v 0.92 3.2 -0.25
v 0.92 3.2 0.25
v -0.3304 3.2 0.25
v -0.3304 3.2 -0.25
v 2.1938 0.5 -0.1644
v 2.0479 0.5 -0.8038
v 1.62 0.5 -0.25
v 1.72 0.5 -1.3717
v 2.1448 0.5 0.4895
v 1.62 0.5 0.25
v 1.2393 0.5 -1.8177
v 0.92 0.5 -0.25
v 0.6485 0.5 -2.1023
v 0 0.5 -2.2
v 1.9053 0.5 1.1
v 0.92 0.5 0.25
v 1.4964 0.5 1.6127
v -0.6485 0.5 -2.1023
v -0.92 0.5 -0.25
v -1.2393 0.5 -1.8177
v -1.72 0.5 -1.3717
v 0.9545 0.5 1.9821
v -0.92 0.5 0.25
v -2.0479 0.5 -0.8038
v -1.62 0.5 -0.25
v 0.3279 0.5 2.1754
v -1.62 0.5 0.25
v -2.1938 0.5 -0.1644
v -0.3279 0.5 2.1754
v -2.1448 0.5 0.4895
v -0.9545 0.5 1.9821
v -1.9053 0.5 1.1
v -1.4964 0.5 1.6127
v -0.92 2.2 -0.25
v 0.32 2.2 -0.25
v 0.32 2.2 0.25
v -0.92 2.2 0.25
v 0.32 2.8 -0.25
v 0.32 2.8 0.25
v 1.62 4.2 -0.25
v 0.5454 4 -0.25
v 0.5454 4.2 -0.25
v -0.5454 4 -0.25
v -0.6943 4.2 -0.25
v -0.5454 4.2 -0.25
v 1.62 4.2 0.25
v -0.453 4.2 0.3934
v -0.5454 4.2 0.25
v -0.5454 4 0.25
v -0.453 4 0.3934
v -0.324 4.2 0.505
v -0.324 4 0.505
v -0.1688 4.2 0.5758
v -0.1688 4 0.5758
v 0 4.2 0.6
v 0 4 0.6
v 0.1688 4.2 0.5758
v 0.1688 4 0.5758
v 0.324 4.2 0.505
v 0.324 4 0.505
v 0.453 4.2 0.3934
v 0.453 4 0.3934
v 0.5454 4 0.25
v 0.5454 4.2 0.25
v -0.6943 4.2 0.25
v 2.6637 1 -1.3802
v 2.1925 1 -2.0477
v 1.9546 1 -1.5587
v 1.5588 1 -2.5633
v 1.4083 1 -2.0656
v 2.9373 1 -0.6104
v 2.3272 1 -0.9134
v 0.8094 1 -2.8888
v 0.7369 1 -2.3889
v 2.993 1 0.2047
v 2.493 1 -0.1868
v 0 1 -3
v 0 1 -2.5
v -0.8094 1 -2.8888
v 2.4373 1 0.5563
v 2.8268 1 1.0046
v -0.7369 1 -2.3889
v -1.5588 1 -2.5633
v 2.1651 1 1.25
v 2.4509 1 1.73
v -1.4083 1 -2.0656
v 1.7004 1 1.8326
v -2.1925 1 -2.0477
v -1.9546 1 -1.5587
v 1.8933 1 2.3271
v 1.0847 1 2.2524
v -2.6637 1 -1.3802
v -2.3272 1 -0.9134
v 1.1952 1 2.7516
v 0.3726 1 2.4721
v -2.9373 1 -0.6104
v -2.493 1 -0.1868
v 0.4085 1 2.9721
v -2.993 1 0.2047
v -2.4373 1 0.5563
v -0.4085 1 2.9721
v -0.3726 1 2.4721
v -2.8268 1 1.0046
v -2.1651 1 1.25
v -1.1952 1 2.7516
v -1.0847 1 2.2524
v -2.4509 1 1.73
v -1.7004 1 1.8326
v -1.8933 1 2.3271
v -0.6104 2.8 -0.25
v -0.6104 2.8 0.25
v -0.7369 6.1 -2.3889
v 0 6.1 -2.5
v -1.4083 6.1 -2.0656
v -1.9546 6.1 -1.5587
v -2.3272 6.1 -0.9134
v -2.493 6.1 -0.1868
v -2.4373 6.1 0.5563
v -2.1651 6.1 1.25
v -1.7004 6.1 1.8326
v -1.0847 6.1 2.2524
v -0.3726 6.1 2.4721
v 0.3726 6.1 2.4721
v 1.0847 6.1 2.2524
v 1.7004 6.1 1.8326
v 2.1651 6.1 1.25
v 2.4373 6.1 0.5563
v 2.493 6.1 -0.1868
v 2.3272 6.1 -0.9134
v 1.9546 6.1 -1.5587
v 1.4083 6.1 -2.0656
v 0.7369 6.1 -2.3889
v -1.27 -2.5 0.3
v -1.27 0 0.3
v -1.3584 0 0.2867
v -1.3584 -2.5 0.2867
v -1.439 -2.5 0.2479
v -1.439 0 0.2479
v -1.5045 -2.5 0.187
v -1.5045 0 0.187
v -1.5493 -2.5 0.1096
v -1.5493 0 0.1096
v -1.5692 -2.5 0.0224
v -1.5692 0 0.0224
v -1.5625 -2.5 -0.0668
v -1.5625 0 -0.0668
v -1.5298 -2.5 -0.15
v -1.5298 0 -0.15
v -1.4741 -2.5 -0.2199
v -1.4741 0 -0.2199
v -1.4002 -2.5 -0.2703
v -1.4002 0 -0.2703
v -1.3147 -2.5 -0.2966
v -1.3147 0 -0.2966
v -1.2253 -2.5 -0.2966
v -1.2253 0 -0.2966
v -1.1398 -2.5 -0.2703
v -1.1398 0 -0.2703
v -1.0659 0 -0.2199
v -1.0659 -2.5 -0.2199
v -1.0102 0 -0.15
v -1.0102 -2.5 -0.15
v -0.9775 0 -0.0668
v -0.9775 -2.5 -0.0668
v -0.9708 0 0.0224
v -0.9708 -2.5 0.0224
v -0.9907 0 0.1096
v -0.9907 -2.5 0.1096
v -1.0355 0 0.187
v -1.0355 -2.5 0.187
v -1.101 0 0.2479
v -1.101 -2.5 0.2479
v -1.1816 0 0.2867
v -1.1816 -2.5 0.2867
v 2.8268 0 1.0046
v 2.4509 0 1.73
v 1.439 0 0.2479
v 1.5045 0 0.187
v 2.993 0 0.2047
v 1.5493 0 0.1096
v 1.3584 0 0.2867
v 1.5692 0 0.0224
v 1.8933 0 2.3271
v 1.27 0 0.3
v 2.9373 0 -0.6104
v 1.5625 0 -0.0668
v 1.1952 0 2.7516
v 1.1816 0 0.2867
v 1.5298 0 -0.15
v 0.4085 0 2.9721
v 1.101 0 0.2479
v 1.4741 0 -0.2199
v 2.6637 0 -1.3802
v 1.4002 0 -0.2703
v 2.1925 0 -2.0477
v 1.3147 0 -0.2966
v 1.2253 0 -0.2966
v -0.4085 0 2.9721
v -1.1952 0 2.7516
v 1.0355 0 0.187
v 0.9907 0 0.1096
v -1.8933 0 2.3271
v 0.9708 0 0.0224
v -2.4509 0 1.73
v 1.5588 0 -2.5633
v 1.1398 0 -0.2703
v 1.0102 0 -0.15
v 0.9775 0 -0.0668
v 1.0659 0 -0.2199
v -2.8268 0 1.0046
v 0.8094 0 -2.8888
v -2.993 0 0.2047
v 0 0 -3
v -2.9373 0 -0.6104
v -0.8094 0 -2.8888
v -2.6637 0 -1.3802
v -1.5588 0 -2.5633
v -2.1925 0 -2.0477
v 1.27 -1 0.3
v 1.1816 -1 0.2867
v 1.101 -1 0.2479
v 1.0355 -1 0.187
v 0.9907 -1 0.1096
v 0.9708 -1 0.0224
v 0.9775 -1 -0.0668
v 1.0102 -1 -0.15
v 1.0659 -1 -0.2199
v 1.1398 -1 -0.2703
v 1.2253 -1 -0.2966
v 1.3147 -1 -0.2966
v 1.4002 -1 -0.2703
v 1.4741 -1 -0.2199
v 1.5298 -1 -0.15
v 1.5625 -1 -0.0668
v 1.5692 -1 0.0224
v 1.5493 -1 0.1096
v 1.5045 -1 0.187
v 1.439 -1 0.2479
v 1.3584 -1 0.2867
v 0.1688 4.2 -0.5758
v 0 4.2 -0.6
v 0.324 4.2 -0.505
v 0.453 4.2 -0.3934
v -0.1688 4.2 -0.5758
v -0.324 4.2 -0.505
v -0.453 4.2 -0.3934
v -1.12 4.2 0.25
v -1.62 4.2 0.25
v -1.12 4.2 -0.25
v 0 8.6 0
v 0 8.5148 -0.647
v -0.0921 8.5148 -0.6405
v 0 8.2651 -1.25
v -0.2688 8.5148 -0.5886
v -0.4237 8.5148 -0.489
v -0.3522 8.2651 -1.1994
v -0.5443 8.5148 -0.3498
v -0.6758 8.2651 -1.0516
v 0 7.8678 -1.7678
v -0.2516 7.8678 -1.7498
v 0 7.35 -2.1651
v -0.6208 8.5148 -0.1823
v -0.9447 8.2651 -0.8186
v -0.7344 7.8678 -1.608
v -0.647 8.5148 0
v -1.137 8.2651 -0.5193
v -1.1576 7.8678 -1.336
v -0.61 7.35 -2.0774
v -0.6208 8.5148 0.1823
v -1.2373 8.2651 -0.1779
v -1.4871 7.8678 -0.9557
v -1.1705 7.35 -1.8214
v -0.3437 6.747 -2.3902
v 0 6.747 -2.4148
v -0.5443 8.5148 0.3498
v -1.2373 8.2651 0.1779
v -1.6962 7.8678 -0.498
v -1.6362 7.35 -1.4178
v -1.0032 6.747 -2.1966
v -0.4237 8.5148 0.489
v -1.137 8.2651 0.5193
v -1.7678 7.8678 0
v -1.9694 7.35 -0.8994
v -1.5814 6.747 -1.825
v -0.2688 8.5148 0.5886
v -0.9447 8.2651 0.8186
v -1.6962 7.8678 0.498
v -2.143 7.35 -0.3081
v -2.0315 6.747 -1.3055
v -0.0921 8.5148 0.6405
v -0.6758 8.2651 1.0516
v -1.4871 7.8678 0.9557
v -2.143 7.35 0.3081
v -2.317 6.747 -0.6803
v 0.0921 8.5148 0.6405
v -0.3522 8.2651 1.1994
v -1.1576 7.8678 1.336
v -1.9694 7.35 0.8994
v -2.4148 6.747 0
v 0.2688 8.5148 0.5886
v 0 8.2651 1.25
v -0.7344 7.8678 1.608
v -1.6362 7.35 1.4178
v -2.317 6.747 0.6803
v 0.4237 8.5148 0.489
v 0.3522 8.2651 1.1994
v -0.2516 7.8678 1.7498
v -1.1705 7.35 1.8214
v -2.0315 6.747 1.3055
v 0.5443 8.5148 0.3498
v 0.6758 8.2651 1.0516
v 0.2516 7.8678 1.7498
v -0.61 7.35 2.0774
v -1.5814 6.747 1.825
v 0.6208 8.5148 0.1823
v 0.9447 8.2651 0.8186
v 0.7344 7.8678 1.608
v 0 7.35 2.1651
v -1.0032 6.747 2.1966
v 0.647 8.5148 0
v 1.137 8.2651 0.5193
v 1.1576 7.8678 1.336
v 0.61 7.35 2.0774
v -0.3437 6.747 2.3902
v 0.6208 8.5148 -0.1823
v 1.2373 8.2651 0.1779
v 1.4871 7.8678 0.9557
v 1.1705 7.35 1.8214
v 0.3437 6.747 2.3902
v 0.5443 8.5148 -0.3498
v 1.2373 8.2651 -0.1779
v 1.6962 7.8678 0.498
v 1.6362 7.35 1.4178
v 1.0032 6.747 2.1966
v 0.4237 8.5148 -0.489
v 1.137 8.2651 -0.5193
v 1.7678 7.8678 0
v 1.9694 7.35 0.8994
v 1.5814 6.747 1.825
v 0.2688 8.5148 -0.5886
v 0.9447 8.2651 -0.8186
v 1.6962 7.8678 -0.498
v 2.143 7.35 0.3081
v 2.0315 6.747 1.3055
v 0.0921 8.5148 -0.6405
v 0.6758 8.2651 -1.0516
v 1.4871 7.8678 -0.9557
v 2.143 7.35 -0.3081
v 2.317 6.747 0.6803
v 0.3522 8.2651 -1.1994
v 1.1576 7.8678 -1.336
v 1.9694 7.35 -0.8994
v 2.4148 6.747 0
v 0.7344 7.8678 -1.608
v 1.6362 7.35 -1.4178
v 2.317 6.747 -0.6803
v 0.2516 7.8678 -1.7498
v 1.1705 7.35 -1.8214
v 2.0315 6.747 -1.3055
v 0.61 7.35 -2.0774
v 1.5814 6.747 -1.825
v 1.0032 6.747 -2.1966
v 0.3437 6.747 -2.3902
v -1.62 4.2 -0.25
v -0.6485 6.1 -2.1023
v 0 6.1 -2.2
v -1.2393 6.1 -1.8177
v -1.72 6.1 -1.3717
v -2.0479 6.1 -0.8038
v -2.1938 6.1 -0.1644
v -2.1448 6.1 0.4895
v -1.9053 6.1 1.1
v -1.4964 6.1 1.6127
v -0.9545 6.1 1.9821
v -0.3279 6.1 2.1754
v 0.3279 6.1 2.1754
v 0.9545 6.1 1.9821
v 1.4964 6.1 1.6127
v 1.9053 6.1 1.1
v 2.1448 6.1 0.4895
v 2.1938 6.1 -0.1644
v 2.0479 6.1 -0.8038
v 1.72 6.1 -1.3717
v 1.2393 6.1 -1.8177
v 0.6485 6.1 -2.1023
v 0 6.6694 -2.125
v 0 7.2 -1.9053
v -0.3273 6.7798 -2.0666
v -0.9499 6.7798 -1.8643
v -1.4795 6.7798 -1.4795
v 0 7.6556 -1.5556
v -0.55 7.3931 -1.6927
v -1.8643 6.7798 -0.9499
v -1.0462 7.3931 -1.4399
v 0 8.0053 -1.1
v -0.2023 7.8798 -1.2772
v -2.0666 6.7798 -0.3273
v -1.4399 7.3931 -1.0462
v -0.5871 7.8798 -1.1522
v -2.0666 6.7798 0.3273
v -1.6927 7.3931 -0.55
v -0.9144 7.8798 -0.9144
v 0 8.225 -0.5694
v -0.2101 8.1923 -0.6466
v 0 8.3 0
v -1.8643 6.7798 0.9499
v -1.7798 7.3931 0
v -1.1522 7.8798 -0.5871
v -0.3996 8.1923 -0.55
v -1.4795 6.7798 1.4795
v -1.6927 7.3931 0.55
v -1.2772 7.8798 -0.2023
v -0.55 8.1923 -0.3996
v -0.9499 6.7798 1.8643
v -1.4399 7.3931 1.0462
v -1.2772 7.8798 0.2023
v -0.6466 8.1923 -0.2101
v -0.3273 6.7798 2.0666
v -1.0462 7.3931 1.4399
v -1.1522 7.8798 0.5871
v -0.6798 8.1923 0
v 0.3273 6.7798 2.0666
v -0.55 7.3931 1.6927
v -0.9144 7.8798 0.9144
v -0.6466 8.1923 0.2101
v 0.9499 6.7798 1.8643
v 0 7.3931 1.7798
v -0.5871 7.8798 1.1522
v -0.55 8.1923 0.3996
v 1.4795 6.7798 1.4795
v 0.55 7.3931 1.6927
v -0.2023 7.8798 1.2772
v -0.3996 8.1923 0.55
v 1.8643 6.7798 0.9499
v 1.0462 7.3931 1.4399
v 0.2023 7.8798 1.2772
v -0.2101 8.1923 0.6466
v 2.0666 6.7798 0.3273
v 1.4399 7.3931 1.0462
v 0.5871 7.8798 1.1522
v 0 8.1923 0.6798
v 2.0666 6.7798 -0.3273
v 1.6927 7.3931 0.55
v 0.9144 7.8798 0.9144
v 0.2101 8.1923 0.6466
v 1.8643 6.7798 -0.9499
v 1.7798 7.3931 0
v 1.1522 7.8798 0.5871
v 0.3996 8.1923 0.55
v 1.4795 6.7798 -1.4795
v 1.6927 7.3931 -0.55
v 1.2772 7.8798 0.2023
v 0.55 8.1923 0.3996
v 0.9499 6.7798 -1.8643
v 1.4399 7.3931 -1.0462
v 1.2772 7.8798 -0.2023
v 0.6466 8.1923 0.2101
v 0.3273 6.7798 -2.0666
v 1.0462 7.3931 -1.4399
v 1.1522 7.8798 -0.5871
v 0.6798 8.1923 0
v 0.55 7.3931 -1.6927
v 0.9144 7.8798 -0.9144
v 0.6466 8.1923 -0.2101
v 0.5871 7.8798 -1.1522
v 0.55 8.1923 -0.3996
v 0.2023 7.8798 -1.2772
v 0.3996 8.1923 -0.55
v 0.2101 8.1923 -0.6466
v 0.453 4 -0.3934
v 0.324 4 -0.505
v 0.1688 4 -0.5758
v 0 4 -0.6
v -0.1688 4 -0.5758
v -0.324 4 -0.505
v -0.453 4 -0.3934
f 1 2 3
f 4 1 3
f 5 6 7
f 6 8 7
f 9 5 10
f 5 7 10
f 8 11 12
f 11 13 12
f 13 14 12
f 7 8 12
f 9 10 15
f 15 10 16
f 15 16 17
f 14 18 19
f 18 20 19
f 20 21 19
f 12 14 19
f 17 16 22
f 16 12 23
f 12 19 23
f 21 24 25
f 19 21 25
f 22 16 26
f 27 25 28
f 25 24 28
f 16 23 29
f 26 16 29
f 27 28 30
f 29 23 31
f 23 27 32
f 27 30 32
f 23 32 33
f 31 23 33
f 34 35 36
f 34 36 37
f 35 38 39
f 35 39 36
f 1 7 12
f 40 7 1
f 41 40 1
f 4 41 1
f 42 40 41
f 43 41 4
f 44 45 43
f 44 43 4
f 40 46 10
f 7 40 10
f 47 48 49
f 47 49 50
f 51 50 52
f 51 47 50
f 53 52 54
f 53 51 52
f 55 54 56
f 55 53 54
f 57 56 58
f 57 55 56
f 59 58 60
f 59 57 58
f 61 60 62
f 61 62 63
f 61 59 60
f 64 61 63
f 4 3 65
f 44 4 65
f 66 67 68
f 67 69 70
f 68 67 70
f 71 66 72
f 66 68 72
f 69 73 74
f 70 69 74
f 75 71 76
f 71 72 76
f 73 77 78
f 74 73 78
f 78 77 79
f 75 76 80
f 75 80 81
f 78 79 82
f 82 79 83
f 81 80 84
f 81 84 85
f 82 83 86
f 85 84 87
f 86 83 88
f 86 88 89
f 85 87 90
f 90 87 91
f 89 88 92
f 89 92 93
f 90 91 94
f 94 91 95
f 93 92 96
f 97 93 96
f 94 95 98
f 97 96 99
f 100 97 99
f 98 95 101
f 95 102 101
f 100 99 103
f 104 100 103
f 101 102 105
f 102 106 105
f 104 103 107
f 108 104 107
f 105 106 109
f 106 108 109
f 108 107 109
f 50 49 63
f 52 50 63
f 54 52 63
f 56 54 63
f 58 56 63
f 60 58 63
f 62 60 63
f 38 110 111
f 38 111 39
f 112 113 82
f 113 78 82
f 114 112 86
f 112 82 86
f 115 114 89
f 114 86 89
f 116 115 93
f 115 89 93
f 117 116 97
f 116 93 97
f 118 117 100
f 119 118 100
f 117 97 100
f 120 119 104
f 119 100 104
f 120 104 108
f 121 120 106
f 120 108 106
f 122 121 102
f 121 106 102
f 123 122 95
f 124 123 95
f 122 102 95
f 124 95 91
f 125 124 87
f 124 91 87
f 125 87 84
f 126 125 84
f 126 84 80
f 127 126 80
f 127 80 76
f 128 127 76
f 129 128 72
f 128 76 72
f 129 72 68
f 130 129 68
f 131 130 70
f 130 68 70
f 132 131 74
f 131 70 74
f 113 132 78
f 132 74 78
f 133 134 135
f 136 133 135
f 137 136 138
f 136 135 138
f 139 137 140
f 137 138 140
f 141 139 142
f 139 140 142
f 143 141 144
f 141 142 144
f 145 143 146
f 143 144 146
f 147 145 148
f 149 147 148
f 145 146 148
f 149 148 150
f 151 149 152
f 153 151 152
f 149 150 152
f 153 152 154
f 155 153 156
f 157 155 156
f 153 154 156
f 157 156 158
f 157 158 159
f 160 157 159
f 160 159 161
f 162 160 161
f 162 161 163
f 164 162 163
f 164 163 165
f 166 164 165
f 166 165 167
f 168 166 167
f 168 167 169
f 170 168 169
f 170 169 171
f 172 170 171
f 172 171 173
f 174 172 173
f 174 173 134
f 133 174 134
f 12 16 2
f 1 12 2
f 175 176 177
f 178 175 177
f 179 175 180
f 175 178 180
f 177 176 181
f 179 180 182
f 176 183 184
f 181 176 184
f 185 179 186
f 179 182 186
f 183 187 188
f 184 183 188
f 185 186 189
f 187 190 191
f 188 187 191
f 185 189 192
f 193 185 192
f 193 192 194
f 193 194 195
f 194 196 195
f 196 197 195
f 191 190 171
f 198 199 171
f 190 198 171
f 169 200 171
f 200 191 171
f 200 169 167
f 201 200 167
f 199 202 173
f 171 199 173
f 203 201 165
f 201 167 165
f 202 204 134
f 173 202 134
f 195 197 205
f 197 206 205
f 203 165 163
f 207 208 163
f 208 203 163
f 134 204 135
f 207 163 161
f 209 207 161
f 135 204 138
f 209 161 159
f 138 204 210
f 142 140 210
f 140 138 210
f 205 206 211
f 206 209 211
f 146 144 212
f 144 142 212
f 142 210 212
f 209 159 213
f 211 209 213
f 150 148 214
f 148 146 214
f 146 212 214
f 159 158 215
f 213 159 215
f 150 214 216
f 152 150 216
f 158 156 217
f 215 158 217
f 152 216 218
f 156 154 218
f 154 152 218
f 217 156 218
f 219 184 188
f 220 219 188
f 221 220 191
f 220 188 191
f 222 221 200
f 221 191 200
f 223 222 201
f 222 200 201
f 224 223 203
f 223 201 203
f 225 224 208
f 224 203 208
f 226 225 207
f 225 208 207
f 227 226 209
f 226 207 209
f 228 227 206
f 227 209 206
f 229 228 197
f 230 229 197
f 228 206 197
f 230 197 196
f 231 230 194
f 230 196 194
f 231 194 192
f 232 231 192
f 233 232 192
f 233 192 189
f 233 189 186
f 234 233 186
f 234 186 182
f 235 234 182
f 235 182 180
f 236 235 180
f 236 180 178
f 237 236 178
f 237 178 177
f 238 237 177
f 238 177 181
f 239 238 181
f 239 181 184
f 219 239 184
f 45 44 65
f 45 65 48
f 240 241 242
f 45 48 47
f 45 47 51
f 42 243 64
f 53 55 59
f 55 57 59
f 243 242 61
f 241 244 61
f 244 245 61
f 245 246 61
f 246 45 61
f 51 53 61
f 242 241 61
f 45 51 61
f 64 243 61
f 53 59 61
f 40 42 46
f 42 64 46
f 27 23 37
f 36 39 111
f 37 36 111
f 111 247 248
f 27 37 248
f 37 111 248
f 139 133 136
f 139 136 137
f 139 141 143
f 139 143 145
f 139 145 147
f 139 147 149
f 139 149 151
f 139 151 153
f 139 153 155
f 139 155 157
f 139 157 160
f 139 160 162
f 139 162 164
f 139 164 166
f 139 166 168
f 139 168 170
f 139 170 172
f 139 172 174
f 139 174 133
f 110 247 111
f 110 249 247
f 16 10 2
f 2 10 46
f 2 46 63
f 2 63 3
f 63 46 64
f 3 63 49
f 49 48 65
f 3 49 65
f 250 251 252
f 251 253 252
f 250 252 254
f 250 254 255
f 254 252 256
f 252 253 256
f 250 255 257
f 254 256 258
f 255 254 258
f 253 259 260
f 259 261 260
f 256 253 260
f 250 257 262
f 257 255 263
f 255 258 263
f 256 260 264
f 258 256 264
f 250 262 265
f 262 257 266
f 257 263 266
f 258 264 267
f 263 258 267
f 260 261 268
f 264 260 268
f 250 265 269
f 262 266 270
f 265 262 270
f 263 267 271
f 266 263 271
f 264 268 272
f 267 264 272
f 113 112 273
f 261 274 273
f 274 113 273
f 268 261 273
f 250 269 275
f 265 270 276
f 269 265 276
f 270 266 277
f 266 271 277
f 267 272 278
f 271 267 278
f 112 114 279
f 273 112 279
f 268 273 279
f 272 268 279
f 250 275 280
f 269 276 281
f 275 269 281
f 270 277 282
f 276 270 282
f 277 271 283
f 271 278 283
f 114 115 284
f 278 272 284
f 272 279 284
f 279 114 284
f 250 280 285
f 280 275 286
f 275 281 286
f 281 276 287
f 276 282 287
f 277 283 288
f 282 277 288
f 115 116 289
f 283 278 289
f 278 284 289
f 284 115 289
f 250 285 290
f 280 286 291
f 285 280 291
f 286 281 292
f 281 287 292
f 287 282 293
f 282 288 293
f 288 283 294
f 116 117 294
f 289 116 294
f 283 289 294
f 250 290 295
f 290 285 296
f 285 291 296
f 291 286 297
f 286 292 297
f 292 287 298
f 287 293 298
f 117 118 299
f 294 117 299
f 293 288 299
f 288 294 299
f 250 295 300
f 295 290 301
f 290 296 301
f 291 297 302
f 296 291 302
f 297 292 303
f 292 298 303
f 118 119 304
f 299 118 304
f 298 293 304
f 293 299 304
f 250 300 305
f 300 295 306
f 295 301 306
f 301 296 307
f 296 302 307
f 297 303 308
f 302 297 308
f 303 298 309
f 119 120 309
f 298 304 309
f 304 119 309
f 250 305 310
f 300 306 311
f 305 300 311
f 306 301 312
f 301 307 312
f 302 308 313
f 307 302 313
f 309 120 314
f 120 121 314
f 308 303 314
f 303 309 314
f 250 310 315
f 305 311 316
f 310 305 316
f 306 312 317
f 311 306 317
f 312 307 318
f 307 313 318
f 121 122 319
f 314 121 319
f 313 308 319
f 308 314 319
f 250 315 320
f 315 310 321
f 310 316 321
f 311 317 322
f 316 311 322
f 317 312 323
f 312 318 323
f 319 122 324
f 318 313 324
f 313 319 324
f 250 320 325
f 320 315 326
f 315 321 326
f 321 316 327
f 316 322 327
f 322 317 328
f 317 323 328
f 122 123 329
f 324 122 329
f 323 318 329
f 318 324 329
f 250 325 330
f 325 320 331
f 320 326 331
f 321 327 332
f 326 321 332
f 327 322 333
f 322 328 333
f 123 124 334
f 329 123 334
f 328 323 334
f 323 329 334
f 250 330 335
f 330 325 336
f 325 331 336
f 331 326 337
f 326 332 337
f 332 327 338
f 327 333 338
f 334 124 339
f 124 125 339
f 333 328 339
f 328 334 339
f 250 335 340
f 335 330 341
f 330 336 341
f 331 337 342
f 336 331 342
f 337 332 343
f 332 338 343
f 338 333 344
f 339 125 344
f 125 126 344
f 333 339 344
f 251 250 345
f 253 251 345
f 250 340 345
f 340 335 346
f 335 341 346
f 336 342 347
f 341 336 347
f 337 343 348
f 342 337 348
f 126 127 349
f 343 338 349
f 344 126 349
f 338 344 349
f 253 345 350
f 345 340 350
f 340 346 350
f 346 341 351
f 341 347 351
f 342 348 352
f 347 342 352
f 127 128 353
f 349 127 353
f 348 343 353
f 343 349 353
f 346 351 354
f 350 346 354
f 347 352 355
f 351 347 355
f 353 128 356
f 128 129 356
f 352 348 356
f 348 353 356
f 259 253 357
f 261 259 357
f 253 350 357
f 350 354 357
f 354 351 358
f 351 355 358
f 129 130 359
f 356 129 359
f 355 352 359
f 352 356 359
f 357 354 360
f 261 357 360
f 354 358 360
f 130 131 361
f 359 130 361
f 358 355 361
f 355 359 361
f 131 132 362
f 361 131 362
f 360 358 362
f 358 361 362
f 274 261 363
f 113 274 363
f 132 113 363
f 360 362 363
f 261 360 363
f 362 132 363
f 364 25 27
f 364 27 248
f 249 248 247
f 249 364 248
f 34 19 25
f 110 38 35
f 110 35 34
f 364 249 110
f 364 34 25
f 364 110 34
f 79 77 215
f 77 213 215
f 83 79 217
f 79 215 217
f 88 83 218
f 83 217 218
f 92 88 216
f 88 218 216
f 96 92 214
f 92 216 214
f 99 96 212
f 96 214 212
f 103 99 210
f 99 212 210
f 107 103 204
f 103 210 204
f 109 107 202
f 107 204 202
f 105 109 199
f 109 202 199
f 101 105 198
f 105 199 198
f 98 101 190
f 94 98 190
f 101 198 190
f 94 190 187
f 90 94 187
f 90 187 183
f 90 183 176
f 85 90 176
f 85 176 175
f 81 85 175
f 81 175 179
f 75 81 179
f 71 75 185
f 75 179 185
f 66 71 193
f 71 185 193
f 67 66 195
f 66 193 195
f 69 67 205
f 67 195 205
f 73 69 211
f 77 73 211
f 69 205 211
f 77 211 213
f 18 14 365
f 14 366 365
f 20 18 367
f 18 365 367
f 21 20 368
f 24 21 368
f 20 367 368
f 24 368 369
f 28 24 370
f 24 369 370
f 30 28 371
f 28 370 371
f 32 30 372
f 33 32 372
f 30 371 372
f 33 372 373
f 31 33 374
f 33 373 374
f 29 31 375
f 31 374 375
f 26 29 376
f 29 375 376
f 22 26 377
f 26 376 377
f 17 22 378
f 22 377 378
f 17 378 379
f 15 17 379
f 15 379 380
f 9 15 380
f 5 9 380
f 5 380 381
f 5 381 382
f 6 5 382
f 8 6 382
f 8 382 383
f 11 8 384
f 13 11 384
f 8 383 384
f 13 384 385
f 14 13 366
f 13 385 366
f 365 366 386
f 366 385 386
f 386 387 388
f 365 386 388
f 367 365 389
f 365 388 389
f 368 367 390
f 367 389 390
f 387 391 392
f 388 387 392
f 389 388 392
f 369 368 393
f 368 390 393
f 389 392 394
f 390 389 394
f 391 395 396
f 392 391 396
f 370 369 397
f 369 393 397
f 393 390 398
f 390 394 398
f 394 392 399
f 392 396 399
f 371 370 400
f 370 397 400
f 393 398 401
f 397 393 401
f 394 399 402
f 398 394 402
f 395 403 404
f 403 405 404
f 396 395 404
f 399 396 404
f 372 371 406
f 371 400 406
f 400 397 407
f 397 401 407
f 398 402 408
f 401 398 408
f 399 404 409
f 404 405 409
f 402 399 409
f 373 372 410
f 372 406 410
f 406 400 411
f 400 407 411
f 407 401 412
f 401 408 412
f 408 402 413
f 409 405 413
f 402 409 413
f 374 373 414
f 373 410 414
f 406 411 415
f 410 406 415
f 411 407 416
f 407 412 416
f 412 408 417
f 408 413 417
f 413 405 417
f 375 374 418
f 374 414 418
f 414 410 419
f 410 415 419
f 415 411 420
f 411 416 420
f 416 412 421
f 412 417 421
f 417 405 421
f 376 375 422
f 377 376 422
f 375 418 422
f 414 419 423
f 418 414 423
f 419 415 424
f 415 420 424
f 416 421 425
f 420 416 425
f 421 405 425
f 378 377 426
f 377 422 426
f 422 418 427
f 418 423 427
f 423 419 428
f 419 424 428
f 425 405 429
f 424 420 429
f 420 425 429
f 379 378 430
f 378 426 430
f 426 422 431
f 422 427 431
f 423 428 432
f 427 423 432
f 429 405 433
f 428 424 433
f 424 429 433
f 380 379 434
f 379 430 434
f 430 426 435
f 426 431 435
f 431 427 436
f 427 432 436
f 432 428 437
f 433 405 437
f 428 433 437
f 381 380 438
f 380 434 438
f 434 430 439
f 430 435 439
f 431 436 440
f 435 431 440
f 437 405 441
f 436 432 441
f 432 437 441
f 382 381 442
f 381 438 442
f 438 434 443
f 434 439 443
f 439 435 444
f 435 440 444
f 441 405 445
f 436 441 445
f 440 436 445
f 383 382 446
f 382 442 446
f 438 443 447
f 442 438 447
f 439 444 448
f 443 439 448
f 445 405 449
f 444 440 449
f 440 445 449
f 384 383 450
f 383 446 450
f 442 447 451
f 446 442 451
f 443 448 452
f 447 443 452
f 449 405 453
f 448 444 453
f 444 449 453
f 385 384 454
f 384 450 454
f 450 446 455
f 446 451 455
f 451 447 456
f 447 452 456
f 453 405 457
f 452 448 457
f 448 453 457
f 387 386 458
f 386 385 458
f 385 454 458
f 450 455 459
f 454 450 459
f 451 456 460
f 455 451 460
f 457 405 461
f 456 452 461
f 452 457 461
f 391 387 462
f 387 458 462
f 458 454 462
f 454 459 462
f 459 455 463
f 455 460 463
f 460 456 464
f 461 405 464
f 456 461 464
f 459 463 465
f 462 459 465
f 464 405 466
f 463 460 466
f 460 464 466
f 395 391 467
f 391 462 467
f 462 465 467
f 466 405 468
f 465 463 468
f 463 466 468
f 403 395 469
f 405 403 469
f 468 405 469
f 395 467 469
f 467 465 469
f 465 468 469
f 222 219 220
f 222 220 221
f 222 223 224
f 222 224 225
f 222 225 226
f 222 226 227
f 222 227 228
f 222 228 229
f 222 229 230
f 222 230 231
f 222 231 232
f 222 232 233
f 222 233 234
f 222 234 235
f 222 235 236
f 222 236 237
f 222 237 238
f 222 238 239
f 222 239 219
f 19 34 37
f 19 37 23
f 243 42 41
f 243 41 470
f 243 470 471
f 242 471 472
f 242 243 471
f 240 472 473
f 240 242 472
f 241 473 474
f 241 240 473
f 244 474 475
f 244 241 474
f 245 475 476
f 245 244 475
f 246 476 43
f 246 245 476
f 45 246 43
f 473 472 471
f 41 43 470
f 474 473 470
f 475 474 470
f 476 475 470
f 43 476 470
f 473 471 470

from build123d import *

# Parameters (mm, degrees)
ESQUISSE2_R        = 0.3
BOSS_EXTRU_1_DEPTH = 2.5
ESQUISSE3_R        = 0.3
BOSS_EXTRU_2_DEPTH = 1
BOSS_EXTRU_3_DEPTH = 0.25
ESQUISSE5_R        = 0.6
BOSS_EXTRU_4_DEPTH = 0.2


with BuildPart() as part:
    # Esquisse1 → Révolution1 (revolve)
    with BuildSketch(Plane.XY, mode=Mode.PRIVATE) as r_volution1_sk:
        with BuildLine():
            Line((-2.5, 6.1), (-2.5, 1))
            Line((-2.5, 1), (-3, 1))
            Line((-3, 1), (-3, 0))
            Line((-3, 0), (0, 0))
            Line((0, 0), (0, 0.5))
            Line((0, 0.5), (-2.2, 0.5))
            Line((-2.2, 0.5), (-2.2, 6.1))
            ThreePointArc((-2.2, 6.1), (-1.555634919, 7.655634919), (0, 8.3))
            Line((0, 8.3), (0, 8.6))
            ThreePointArc((0, 8.6), (-1.767766953, 7.867766953), (-2.5, 6.1))
        make_face()
    revolve(r_volution1_sk.sketch.rotate(Axis((0, 0, 0), (0, 1, 0)), 270), axis=Axis((0, 0, 0), (0, 1, 0)))

    # Esquisse2 → Boss.-Extru.1 (add)
    with BuildSketch(Plane.XZ):
        with Locations(Location((-1.27, 0, 0), (0, 0, 90))):
            Circle(ESQUISSE2_R)
    extrude(amount=BOSS_EXTRU_1_DEPTH)

    # Esquisse3 → Boss.-Extru.2 (add)
    with BuildSketch(Plane.XZ):
        with Locations(Location((1.27, 0, 0), (0, 0, 90))):
            Circle(ESQUISSE3_R)
    extrude(amount=BOSS_EXTRU_2_DEPTH)

    # Esquisse4 → Boss.-Extru.3 (add, symmetric)
    with BuildSketch(Plane.XY):
        Polygon((-1.12, 4.2), (-0.610441672, 2.8), (0.32, 2.8), (0.32, 2.2), (-0.92, 2.2), (-0.92, 0), (-1.62, 0), (-1.62, 4.2), align=None)
        Polygon((-0.694328891, 4.2), (1.62, 4.2), (1.62, 0), (0.92, 0), (0.92, 3.2), (-0.330358657, 3.2), align=None)
    extrude(amount=BOSS_EXTRU_3_DEPTH, both=True)

    # Esquisse5 → Boss.-Extru.4 (add)
    with BuildSketch(Plane(origin=(0, 4.2, 0), x_dir=(1, 0, 0), z_dir=(0, 1, 0))):
        Circle(ESQUISSE5_R)
    extrude(amount=-BOSS_EXTRU_4_DEPTH)


solid = part.part
